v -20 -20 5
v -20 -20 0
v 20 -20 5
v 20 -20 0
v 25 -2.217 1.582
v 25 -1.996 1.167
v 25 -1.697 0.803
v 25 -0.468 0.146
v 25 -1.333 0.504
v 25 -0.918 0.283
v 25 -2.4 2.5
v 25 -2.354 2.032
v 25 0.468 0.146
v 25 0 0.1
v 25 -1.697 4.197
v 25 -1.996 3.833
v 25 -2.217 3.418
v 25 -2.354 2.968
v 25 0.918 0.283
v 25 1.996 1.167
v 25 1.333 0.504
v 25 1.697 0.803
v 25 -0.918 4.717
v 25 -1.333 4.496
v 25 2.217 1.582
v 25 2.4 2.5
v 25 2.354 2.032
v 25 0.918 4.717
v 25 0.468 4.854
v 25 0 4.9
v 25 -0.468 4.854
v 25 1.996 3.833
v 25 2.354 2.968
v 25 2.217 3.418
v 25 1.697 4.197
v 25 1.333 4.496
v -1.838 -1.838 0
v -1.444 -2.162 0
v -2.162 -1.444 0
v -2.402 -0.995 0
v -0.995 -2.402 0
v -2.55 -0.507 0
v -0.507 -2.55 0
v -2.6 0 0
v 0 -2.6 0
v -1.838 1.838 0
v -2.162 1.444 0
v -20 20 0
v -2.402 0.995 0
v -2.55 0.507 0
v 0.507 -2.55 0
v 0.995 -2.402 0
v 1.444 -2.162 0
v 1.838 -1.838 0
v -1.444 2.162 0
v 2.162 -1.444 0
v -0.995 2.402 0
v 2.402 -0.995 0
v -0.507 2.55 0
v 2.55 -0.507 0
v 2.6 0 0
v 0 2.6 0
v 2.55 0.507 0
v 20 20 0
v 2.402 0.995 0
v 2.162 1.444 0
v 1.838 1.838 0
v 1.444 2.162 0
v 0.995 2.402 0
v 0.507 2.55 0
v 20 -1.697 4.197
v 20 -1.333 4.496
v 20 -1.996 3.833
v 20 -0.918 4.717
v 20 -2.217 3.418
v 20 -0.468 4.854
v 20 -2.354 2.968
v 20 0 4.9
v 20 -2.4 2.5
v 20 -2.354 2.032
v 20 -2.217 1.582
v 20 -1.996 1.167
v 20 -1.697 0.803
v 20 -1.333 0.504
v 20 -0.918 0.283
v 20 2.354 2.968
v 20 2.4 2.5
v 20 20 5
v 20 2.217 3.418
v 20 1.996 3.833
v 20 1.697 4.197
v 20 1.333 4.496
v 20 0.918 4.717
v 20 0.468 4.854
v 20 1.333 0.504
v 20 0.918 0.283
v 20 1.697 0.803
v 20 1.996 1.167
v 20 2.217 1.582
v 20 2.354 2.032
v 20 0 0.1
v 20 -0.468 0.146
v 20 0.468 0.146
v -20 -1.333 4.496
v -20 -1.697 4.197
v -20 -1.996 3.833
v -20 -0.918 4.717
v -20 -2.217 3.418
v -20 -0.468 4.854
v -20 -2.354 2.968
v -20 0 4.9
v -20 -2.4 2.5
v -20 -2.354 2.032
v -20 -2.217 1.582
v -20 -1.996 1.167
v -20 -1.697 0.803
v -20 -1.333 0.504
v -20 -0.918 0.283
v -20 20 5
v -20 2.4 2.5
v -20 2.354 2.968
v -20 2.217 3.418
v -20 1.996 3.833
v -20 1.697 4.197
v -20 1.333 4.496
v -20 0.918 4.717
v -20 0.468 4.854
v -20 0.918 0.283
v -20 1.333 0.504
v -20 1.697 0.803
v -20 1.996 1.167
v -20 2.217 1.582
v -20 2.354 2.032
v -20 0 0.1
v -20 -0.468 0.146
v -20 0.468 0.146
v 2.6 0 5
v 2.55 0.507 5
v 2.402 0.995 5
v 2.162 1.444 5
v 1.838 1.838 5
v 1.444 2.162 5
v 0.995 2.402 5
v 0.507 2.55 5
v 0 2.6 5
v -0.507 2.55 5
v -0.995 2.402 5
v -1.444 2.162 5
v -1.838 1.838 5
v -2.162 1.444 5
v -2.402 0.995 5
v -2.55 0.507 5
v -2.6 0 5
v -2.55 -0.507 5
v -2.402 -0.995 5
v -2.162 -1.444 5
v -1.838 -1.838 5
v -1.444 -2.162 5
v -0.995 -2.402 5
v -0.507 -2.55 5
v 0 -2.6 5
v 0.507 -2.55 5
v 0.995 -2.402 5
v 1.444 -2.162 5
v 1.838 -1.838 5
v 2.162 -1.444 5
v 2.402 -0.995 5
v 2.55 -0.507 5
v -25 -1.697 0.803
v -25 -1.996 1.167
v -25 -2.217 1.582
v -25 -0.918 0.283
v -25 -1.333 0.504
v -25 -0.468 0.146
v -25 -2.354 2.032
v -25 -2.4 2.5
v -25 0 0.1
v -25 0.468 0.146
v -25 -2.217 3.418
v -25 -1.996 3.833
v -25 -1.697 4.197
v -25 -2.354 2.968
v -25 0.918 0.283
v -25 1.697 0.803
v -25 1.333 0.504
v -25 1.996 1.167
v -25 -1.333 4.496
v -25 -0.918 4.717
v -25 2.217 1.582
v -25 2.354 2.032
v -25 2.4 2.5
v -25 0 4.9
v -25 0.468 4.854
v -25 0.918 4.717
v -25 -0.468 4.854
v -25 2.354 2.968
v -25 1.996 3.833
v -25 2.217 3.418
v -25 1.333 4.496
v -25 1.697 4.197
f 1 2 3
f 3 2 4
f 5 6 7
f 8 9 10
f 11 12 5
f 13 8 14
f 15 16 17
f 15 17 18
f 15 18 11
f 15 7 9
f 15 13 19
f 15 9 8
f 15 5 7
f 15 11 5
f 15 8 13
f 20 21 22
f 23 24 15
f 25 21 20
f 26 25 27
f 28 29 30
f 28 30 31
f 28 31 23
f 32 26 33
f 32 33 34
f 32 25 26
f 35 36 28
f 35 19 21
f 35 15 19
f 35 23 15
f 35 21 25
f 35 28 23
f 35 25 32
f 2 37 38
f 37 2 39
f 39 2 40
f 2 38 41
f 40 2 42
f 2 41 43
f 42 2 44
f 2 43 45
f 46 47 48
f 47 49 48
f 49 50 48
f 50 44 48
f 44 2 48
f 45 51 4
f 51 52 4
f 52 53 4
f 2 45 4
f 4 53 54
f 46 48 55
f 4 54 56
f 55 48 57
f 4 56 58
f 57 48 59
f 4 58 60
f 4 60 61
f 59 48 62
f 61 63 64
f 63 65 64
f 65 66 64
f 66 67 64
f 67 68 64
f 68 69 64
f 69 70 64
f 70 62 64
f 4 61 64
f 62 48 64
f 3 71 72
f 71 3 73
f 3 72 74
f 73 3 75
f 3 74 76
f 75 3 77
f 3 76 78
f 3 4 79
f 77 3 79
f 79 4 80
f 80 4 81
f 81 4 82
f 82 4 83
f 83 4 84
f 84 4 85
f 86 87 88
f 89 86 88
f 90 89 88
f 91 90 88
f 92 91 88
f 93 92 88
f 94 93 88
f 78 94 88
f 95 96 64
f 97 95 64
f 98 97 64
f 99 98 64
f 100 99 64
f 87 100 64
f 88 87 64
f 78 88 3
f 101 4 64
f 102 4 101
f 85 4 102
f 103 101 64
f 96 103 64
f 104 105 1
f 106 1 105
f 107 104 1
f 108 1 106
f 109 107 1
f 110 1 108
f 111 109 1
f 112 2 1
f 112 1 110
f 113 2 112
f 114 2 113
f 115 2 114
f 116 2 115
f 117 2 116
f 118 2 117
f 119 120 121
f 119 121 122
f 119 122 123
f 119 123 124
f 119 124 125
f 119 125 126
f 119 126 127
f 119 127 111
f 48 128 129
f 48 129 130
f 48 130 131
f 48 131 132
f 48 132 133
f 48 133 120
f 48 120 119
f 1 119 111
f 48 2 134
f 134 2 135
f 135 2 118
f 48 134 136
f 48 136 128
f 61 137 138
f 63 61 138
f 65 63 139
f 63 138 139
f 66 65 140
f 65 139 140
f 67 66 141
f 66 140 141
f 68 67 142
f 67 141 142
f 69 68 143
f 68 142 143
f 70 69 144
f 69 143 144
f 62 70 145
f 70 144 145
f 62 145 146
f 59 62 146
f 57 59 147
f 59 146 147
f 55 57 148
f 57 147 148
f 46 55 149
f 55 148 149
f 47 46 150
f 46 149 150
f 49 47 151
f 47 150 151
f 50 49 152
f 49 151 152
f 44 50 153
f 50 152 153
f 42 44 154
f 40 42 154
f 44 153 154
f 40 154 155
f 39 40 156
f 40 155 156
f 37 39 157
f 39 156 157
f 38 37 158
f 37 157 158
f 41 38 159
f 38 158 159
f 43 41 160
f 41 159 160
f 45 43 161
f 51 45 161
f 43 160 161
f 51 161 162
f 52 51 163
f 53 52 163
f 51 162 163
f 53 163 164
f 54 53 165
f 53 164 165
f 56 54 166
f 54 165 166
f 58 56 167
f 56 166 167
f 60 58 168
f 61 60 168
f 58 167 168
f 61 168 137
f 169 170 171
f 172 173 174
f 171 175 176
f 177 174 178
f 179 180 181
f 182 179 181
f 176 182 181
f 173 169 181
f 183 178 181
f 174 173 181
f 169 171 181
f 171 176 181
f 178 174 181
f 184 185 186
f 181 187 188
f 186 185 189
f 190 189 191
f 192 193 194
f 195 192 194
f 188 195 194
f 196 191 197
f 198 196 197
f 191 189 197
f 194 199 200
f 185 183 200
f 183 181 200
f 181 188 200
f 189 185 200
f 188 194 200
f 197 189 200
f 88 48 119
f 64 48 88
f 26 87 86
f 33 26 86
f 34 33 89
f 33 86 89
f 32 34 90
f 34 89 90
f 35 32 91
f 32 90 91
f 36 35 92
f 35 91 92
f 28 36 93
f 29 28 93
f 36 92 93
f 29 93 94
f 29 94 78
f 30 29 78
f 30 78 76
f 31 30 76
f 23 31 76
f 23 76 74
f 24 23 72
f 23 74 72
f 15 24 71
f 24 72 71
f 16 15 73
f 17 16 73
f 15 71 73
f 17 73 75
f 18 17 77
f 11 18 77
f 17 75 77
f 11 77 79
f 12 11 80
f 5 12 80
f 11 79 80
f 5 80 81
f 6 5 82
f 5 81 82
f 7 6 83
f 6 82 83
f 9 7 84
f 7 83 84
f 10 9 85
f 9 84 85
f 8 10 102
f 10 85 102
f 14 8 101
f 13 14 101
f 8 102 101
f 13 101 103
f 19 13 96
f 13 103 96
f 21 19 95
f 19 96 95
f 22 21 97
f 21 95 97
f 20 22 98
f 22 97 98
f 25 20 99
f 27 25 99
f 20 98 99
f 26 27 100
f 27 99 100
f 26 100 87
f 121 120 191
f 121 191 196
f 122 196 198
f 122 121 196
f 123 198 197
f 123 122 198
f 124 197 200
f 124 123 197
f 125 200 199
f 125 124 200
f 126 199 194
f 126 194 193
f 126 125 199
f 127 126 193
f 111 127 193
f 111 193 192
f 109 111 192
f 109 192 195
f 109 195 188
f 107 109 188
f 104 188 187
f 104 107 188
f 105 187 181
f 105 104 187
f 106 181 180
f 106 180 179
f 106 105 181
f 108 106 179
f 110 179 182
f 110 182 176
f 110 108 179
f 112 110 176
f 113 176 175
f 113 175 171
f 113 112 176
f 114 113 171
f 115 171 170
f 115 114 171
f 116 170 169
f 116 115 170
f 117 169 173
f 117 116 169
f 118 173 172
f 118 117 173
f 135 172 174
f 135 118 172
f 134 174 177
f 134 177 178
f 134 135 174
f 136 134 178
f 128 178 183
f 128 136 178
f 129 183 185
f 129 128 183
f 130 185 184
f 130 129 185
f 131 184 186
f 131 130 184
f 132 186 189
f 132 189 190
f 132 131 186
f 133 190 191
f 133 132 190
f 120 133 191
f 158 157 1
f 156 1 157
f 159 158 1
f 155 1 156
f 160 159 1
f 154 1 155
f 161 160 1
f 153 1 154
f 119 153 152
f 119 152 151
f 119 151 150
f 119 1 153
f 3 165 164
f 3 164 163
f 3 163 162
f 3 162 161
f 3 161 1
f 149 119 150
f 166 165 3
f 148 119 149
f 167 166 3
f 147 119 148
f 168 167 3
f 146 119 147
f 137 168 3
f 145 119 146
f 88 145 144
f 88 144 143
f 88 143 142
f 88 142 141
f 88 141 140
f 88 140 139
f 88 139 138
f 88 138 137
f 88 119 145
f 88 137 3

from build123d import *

# Parameters (mm, degrees)
F0_W     = 40
F0_H     = 40
F1_DEPTH = 5
F2_R     = 2.6
F3_DEPTH = 25.4
F4_R     = 2.4
F5_DEPTH = 5


with BuildPart() as f1:
    # F0 (on Top) → F1 (new body)
    with BuildSketch(Plane.XY):
        Rectangle(F0_W, F0_H)
    extrude(amount=F1_DEPTH)

    # F2 (on face) → F3 (cut)
    with BuildSketch(Plane.XY.offset(5)):
        Circle(F2_R)
    extrude(amount=-F3_DEPTH, mode=Mode.SUBTRACT)

    # F4 (on face) → F5 (join)
    with BuildSketch(Plane.YZ.offset(20)):
        with Locations((0, 2.5)):
            Circle(F4_R)
    extrude(amount=F5_DEPTH)

    # F6: F1 across plane


with BuildPart() as f1_1:
    add(f1.part)
    add(f1.part.mirror(Plane.YZ))


solid = f1_1.part
